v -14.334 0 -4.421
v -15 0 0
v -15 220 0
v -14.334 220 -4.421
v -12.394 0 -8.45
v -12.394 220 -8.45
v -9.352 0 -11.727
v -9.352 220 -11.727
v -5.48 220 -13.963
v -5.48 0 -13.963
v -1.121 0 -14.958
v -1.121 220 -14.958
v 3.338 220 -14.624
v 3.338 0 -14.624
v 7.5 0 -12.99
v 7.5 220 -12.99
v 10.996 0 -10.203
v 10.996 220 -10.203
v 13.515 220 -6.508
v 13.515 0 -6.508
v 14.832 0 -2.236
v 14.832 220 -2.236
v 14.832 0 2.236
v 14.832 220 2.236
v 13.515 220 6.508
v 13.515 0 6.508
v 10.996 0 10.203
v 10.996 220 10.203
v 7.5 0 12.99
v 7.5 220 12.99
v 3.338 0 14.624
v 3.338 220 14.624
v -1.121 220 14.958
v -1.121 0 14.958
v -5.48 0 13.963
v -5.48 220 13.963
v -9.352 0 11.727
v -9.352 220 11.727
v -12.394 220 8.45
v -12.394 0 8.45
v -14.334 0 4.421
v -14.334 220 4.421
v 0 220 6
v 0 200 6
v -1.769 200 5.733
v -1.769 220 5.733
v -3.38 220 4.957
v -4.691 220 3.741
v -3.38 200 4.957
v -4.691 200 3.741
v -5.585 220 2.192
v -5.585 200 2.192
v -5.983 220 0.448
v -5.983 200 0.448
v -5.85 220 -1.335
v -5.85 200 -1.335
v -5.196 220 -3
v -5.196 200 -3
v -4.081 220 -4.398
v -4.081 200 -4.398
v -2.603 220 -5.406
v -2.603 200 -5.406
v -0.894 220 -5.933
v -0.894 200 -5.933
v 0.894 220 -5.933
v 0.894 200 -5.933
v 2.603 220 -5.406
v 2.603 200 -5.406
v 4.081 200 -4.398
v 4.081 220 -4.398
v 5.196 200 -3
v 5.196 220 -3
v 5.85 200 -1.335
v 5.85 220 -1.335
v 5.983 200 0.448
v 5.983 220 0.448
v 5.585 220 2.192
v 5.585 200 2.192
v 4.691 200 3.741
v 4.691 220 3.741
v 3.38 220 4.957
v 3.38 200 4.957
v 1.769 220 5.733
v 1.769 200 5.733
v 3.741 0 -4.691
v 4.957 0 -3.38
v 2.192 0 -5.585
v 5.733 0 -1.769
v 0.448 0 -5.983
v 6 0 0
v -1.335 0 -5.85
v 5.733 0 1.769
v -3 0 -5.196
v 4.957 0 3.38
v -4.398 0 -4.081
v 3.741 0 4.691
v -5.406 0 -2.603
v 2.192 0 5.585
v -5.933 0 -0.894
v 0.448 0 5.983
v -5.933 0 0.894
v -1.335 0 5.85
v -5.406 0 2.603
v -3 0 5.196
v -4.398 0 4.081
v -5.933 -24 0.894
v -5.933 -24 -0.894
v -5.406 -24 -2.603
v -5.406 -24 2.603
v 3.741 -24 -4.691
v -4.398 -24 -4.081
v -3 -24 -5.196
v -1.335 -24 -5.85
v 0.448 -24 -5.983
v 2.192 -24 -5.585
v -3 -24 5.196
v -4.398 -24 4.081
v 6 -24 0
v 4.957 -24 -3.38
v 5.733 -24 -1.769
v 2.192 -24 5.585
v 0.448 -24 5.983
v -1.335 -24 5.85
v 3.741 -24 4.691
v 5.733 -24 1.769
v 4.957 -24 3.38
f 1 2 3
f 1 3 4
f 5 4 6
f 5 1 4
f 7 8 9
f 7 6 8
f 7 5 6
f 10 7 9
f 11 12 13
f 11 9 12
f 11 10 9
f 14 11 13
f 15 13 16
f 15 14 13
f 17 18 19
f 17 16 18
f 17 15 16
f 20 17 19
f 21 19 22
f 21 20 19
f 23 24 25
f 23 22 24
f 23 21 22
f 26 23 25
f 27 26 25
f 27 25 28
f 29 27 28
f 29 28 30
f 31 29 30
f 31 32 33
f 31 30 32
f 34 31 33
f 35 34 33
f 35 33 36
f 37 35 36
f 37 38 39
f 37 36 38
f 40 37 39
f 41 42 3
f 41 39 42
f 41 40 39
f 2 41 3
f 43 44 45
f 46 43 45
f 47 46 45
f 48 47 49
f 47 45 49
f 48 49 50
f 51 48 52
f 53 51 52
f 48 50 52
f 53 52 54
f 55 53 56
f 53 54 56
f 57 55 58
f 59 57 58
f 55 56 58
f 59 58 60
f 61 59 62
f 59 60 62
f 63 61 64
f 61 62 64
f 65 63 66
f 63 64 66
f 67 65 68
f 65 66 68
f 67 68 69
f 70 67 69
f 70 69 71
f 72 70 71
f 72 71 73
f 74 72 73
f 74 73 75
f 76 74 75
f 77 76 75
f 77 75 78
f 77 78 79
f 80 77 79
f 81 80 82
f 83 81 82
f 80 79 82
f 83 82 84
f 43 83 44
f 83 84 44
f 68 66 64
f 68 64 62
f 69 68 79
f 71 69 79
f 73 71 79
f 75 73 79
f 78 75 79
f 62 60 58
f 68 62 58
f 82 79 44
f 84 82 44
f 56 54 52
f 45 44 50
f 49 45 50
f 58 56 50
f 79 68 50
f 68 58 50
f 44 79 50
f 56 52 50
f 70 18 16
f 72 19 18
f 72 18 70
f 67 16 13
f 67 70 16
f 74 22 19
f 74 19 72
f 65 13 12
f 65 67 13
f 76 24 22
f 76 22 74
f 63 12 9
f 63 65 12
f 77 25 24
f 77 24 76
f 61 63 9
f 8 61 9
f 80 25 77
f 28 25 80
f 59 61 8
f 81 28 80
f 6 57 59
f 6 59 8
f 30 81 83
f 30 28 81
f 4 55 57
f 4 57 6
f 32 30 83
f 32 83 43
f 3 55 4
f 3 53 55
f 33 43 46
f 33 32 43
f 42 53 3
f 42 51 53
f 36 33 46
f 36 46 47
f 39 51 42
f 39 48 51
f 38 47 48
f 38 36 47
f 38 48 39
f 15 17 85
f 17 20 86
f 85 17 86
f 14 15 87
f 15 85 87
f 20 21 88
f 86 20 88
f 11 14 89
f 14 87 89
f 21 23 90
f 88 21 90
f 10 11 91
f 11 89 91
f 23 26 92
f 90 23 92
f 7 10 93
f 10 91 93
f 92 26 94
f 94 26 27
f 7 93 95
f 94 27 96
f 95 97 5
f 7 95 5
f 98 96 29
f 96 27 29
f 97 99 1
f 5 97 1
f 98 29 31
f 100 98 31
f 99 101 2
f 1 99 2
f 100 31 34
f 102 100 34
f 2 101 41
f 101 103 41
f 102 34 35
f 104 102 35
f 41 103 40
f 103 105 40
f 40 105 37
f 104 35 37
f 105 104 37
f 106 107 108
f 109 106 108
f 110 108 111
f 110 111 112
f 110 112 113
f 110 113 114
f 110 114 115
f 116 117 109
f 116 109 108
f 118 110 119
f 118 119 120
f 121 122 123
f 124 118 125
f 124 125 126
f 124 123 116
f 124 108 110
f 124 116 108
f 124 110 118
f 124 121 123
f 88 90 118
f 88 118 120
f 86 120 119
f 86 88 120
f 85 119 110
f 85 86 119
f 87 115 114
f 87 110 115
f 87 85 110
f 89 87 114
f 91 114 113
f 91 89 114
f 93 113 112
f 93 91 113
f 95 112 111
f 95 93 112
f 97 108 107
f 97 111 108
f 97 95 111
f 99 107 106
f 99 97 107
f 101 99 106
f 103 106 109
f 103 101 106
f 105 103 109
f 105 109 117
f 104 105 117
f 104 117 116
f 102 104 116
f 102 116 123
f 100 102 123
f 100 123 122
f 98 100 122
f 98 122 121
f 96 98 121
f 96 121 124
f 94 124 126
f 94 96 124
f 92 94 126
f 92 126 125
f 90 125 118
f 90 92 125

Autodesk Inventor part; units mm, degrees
ref_plane "YZ Plane" through (0, 0, 0) normal (1, 0, 0) x (0, 1, 0)
ref_plane "XZ Plane" through (0, 0, 0) normal (0, 1, 0) x (-1, 0, 0)
ref_plane "XY Plane" through (0, 0, 0) normal (0, 0, 1) x (1, 0, 0)
sketch "Skizze1" plane through (0, 0, 0) normal (0, 1, 0) x (-1, 0, 0)
  circle A0 centre (0, 0) radius 15
  dimension "d0" = 30
extrude "Extrusion1" add sketch "Skizze1" along normal blind 220
sketch "Skizze2" plane through (0, 0, 0) normal (0, -1, 0) x (1, 0, 0)
  circle A0 centre (0, 0) radius 6
  dimension "d3" = 12
extrude "Extrusion2" add sketch "Skizze2" along normal blind 24
thread "Gewinde1" size "M12x1.75" class "6g" standard "ISO Metric profile" full length
sketch "Skizze3" plane through (0, 220, 0) normal (0, 1, 0) x (1, 0, 0)
  circle A0 centre (0, 0) radius 15 projected
hole "Bohrung1" at (0, 220, 0) direction (0, -1, 0) diameter 12 depth 20
properties part number "3" material "Kupfer, Legierung"
